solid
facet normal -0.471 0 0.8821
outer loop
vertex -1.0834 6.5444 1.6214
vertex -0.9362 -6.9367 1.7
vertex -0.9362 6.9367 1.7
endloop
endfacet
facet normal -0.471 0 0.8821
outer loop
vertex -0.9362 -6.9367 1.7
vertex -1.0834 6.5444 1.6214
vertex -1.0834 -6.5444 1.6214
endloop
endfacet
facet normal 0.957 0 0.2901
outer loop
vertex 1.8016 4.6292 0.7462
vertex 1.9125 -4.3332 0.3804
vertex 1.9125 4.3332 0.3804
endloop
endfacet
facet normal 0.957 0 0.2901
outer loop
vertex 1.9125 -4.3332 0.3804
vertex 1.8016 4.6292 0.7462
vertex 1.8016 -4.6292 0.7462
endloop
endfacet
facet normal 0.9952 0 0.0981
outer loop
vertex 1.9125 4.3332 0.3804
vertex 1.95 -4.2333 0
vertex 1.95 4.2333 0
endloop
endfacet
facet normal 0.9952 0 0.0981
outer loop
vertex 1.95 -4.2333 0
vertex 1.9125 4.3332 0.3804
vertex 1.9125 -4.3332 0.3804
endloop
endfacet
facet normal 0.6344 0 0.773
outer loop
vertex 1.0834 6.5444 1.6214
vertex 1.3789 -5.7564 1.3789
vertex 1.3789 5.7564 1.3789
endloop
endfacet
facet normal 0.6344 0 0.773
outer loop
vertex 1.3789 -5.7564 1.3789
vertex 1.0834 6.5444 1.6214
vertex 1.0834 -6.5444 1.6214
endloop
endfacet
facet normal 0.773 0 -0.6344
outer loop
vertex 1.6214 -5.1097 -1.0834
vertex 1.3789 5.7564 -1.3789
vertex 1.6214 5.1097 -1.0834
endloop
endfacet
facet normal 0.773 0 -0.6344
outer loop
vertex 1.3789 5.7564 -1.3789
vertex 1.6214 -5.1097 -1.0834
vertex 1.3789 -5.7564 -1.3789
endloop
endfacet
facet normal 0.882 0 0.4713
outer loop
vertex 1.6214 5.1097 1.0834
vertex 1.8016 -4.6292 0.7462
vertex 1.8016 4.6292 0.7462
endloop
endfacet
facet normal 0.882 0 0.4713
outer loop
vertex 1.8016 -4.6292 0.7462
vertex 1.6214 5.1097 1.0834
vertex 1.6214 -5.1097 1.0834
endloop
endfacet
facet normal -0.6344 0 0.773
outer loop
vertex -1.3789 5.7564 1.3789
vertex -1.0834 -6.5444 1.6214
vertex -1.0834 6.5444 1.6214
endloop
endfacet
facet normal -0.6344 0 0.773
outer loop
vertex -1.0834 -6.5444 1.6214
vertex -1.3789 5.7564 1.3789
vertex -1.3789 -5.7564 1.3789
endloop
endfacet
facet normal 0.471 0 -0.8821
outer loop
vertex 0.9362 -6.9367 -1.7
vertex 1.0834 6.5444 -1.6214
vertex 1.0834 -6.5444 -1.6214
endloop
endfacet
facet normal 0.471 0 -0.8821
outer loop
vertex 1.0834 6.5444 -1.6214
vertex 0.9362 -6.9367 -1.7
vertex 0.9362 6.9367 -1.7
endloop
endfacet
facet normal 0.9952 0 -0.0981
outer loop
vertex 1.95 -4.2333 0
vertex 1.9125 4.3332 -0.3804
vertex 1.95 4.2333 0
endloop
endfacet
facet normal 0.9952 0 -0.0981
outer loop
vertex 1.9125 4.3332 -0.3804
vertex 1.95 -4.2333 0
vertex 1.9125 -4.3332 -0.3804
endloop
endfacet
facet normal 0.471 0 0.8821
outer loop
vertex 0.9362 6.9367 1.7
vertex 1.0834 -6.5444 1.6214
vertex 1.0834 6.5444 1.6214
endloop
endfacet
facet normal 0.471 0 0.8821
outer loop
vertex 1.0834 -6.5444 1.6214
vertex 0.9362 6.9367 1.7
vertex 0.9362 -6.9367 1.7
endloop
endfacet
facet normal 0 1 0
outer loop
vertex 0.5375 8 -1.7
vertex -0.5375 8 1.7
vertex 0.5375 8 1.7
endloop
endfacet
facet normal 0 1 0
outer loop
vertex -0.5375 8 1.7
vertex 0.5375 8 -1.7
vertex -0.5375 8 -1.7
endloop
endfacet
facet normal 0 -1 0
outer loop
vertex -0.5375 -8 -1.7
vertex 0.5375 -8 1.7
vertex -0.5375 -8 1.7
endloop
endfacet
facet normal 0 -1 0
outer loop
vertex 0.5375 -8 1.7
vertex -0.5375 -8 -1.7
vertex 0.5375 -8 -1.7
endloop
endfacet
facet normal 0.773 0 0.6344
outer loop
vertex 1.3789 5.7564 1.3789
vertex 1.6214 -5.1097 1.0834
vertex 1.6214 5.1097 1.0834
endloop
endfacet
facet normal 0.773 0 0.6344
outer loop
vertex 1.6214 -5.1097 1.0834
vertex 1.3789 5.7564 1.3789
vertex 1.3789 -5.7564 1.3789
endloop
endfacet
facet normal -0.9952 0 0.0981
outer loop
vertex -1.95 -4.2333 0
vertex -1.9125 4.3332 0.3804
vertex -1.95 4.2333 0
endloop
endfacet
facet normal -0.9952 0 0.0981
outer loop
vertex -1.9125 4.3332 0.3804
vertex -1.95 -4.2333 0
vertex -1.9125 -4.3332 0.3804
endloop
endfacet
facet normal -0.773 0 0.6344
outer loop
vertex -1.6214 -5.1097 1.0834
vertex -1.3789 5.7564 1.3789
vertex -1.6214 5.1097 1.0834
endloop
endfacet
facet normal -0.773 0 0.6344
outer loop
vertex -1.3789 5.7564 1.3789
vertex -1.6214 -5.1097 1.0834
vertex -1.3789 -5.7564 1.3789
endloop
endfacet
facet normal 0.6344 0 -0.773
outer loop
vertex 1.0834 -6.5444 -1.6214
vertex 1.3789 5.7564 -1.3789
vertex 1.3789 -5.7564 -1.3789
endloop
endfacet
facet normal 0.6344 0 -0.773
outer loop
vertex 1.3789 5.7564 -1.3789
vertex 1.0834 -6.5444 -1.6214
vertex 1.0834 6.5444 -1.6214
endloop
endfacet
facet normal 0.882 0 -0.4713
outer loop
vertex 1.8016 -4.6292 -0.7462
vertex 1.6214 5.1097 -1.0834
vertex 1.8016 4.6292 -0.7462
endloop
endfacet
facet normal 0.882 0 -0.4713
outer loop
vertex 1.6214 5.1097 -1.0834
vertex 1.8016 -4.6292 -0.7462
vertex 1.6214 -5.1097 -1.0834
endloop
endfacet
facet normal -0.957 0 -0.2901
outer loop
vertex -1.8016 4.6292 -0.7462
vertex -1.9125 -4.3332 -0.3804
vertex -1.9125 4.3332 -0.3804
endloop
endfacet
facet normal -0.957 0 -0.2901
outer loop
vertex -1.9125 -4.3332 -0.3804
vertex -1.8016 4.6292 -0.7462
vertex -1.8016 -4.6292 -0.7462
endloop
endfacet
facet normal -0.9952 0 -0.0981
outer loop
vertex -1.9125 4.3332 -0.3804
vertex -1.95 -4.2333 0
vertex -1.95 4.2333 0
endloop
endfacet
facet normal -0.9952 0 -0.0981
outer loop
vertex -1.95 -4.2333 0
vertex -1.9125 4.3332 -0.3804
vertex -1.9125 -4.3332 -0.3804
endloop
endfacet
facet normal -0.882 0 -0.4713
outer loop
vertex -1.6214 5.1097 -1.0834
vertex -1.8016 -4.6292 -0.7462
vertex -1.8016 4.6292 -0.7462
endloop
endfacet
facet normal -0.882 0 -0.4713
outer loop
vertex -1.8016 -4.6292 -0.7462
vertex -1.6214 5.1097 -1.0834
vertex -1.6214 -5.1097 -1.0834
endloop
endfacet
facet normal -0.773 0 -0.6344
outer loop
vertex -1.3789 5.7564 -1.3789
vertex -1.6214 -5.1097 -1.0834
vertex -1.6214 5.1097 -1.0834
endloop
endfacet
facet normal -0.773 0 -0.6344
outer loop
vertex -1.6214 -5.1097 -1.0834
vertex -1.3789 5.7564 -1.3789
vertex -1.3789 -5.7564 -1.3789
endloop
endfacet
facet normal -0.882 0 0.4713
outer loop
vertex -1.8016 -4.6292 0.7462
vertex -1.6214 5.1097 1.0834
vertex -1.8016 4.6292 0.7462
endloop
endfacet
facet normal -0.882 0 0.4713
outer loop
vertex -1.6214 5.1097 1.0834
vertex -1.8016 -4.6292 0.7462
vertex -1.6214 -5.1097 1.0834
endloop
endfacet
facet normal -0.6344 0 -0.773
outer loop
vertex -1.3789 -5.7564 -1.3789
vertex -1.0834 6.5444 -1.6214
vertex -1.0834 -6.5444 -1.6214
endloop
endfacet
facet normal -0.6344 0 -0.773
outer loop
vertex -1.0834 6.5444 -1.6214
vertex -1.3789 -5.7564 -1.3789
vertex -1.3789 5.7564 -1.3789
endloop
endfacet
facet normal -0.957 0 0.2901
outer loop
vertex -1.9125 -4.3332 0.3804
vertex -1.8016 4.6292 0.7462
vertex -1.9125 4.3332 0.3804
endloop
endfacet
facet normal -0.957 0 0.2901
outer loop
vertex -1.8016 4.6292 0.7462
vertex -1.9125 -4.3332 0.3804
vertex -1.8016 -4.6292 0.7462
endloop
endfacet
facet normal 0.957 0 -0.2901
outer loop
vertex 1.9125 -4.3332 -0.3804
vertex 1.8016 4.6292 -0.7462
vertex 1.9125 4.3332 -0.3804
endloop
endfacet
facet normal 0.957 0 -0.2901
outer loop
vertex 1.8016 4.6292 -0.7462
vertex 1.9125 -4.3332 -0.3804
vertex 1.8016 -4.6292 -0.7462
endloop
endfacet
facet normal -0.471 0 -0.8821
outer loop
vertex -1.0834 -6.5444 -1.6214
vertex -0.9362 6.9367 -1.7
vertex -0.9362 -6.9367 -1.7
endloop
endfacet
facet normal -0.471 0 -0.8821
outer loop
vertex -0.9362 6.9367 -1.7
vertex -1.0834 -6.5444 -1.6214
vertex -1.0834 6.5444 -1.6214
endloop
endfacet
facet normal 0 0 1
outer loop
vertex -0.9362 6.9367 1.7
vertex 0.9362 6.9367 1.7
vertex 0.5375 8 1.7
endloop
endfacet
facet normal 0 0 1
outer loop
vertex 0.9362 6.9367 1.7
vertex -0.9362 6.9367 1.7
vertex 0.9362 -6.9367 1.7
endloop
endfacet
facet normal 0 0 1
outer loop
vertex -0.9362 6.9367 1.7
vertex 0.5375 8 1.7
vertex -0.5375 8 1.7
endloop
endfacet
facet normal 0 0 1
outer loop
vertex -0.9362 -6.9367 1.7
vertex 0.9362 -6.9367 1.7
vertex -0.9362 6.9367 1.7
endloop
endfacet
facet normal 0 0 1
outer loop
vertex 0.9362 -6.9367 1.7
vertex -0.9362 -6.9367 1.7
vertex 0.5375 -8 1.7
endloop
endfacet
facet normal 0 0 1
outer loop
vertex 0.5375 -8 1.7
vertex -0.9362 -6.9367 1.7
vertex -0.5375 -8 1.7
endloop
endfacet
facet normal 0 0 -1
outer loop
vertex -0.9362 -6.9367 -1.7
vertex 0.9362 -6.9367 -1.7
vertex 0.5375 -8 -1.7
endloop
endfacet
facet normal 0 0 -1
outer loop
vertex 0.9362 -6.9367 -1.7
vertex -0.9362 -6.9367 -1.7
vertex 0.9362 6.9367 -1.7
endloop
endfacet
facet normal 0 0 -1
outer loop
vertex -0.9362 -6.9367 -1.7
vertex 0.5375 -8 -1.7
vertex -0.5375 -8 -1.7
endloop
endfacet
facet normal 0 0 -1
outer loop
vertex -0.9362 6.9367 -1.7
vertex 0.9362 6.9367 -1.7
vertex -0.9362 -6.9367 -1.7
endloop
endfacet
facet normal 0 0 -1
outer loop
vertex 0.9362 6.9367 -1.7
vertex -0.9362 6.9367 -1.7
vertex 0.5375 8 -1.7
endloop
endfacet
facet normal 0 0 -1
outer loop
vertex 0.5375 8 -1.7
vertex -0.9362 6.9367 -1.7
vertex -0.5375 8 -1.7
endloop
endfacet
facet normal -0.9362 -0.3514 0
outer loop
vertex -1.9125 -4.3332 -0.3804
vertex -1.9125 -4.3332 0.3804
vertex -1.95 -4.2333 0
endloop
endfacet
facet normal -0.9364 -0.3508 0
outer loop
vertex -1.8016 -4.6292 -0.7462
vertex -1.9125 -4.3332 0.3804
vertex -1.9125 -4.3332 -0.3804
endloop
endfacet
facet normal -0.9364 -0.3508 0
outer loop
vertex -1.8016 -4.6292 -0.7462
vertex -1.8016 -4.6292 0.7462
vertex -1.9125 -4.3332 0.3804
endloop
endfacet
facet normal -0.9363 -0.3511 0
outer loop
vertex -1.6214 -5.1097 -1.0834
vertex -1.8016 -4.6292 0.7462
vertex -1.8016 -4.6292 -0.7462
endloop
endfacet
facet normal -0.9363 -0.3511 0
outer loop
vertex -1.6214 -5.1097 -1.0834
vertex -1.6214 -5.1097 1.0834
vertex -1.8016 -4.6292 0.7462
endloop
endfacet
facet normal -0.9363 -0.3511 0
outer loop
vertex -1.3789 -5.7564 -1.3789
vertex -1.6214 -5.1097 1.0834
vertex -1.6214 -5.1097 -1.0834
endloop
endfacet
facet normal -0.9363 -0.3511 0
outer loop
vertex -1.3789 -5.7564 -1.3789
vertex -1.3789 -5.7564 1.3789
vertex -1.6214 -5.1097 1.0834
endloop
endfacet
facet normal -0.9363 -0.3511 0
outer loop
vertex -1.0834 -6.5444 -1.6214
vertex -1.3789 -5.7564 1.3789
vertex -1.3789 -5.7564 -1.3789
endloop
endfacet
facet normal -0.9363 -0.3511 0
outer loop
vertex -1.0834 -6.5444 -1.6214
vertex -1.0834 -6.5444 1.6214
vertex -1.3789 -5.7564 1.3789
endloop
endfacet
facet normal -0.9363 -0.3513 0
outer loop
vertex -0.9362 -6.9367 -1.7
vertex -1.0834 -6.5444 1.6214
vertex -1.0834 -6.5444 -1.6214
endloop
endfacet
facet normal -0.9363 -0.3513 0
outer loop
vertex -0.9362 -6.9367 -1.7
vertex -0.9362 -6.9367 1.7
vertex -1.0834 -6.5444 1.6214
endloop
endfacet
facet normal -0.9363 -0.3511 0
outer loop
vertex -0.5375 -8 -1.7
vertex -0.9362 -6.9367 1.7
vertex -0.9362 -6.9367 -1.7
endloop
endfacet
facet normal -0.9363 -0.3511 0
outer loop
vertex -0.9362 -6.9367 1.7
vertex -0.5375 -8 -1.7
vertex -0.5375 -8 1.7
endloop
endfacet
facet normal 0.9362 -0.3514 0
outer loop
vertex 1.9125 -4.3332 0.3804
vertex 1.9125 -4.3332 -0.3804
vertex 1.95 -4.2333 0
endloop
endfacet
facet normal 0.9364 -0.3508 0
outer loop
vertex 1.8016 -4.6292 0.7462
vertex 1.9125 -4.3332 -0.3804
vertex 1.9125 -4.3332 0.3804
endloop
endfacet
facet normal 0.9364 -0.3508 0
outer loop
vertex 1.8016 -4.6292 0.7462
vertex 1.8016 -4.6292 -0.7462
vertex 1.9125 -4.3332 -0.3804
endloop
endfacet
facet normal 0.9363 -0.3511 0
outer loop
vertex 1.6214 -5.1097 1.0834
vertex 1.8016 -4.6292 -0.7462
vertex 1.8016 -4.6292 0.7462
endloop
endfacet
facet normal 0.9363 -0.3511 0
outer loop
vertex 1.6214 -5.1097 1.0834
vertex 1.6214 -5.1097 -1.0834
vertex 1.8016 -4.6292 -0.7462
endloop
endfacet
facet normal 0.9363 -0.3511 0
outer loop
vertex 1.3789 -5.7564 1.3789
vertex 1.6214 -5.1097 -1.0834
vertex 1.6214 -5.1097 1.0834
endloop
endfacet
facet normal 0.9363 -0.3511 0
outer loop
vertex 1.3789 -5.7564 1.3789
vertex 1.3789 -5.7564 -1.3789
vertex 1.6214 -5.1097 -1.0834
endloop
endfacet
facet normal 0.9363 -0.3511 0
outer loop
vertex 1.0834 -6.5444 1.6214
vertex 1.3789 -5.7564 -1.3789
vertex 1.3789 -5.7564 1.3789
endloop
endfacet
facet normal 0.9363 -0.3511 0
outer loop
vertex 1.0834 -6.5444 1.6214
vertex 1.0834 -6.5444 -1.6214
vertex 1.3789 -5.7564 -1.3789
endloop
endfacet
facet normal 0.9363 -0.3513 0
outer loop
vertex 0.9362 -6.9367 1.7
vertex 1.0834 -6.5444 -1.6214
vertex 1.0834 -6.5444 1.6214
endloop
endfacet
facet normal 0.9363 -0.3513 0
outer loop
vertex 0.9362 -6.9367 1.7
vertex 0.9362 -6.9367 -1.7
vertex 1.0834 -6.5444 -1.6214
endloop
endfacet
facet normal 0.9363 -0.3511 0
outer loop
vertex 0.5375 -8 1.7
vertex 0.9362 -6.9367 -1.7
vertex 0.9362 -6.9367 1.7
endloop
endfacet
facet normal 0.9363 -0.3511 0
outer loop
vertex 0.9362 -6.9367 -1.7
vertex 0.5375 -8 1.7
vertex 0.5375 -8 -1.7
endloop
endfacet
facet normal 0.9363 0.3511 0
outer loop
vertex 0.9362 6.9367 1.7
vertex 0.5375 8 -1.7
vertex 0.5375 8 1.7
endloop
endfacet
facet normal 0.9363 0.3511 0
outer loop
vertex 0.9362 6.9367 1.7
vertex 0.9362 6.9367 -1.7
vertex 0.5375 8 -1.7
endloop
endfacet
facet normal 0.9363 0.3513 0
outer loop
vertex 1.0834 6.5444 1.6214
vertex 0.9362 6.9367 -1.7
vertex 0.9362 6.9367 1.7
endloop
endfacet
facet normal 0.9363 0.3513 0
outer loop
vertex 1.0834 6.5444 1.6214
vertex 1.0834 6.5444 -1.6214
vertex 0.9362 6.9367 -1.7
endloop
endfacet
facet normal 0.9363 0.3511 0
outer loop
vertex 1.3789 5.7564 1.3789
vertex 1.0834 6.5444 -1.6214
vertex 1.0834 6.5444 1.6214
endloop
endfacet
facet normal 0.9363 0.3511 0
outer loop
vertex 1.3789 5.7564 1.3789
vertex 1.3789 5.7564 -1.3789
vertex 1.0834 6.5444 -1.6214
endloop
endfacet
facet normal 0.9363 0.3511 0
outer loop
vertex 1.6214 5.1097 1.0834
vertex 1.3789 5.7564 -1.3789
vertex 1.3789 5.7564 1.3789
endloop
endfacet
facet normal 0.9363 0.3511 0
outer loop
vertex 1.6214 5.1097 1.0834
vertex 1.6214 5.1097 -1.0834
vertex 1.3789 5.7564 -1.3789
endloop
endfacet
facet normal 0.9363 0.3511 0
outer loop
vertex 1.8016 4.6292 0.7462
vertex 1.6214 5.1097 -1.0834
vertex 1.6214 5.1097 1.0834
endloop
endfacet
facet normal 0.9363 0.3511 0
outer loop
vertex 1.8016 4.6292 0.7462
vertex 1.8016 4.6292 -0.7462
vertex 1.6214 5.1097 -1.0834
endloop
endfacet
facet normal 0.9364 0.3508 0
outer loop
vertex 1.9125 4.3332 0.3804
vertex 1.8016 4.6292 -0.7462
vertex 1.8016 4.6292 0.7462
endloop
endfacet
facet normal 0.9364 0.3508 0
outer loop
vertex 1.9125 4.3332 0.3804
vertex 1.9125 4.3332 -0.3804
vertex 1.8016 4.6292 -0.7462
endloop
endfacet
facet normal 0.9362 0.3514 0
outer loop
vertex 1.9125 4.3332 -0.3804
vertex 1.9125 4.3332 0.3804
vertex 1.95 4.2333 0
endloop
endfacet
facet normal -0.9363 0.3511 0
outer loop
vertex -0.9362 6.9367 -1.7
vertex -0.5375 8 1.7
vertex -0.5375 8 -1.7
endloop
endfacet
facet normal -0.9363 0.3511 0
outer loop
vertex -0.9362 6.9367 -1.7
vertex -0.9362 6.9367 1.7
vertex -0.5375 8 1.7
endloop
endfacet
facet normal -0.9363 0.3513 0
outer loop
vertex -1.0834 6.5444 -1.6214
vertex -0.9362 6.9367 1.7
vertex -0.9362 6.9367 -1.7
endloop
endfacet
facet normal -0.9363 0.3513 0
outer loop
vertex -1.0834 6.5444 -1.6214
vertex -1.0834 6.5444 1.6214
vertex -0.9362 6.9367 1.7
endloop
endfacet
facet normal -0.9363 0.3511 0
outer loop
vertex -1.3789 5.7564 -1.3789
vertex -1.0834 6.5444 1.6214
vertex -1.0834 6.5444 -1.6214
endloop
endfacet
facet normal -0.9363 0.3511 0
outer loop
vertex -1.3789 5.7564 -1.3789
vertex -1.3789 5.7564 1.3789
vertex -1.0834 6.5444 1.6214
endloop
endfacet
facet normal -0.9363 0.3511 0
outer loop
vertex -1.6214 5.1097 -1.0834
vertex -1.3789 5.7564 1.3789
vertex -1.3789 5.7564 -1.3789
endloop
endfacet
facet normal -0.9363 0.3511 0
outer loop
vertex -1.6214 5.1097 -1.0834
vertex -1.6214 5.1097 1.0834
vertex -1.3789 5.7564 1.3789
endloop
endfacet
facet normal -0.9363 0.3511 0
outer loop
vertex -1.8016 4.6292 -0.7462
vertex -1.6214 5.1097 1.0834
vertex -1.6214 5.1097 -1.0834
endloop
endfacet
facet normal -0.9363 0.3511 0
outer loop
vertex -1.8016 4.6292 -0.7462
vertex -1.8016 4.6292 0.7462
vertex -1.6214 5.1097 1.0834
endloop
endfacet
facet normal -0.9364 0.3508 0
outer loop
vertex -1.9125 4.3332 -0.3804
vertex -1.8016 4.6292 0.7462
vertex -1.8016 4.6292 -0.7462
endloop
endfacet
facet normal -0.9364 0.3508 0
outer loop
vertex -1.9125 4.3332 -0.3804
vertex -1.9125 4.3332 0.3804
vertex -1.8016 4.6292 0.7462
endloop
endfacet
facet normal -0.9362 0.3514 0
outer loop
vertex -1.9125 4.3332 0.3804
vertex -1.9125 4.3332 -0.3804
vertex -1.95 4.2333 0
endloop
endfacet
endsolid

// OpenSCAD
intersection() {
    rotate([90,0,0])
    cylinder(d=3.9, h=16, $fn=32, center=true);

    cube([16, 16, 3.4], center=true);

    linear_extrude(height=6, center=true)
    polygon([
        [-0.5, -8.1],
        [-2.0, -4.1],
        [-2.0,  4.1],
        [-0.5,  8.1],
        [ 0.5,  8.1],
        [ 2.0,  4.1],
        [ 2.0, -4.1],
        [ 0.5, -8.1],
    ]);
}
